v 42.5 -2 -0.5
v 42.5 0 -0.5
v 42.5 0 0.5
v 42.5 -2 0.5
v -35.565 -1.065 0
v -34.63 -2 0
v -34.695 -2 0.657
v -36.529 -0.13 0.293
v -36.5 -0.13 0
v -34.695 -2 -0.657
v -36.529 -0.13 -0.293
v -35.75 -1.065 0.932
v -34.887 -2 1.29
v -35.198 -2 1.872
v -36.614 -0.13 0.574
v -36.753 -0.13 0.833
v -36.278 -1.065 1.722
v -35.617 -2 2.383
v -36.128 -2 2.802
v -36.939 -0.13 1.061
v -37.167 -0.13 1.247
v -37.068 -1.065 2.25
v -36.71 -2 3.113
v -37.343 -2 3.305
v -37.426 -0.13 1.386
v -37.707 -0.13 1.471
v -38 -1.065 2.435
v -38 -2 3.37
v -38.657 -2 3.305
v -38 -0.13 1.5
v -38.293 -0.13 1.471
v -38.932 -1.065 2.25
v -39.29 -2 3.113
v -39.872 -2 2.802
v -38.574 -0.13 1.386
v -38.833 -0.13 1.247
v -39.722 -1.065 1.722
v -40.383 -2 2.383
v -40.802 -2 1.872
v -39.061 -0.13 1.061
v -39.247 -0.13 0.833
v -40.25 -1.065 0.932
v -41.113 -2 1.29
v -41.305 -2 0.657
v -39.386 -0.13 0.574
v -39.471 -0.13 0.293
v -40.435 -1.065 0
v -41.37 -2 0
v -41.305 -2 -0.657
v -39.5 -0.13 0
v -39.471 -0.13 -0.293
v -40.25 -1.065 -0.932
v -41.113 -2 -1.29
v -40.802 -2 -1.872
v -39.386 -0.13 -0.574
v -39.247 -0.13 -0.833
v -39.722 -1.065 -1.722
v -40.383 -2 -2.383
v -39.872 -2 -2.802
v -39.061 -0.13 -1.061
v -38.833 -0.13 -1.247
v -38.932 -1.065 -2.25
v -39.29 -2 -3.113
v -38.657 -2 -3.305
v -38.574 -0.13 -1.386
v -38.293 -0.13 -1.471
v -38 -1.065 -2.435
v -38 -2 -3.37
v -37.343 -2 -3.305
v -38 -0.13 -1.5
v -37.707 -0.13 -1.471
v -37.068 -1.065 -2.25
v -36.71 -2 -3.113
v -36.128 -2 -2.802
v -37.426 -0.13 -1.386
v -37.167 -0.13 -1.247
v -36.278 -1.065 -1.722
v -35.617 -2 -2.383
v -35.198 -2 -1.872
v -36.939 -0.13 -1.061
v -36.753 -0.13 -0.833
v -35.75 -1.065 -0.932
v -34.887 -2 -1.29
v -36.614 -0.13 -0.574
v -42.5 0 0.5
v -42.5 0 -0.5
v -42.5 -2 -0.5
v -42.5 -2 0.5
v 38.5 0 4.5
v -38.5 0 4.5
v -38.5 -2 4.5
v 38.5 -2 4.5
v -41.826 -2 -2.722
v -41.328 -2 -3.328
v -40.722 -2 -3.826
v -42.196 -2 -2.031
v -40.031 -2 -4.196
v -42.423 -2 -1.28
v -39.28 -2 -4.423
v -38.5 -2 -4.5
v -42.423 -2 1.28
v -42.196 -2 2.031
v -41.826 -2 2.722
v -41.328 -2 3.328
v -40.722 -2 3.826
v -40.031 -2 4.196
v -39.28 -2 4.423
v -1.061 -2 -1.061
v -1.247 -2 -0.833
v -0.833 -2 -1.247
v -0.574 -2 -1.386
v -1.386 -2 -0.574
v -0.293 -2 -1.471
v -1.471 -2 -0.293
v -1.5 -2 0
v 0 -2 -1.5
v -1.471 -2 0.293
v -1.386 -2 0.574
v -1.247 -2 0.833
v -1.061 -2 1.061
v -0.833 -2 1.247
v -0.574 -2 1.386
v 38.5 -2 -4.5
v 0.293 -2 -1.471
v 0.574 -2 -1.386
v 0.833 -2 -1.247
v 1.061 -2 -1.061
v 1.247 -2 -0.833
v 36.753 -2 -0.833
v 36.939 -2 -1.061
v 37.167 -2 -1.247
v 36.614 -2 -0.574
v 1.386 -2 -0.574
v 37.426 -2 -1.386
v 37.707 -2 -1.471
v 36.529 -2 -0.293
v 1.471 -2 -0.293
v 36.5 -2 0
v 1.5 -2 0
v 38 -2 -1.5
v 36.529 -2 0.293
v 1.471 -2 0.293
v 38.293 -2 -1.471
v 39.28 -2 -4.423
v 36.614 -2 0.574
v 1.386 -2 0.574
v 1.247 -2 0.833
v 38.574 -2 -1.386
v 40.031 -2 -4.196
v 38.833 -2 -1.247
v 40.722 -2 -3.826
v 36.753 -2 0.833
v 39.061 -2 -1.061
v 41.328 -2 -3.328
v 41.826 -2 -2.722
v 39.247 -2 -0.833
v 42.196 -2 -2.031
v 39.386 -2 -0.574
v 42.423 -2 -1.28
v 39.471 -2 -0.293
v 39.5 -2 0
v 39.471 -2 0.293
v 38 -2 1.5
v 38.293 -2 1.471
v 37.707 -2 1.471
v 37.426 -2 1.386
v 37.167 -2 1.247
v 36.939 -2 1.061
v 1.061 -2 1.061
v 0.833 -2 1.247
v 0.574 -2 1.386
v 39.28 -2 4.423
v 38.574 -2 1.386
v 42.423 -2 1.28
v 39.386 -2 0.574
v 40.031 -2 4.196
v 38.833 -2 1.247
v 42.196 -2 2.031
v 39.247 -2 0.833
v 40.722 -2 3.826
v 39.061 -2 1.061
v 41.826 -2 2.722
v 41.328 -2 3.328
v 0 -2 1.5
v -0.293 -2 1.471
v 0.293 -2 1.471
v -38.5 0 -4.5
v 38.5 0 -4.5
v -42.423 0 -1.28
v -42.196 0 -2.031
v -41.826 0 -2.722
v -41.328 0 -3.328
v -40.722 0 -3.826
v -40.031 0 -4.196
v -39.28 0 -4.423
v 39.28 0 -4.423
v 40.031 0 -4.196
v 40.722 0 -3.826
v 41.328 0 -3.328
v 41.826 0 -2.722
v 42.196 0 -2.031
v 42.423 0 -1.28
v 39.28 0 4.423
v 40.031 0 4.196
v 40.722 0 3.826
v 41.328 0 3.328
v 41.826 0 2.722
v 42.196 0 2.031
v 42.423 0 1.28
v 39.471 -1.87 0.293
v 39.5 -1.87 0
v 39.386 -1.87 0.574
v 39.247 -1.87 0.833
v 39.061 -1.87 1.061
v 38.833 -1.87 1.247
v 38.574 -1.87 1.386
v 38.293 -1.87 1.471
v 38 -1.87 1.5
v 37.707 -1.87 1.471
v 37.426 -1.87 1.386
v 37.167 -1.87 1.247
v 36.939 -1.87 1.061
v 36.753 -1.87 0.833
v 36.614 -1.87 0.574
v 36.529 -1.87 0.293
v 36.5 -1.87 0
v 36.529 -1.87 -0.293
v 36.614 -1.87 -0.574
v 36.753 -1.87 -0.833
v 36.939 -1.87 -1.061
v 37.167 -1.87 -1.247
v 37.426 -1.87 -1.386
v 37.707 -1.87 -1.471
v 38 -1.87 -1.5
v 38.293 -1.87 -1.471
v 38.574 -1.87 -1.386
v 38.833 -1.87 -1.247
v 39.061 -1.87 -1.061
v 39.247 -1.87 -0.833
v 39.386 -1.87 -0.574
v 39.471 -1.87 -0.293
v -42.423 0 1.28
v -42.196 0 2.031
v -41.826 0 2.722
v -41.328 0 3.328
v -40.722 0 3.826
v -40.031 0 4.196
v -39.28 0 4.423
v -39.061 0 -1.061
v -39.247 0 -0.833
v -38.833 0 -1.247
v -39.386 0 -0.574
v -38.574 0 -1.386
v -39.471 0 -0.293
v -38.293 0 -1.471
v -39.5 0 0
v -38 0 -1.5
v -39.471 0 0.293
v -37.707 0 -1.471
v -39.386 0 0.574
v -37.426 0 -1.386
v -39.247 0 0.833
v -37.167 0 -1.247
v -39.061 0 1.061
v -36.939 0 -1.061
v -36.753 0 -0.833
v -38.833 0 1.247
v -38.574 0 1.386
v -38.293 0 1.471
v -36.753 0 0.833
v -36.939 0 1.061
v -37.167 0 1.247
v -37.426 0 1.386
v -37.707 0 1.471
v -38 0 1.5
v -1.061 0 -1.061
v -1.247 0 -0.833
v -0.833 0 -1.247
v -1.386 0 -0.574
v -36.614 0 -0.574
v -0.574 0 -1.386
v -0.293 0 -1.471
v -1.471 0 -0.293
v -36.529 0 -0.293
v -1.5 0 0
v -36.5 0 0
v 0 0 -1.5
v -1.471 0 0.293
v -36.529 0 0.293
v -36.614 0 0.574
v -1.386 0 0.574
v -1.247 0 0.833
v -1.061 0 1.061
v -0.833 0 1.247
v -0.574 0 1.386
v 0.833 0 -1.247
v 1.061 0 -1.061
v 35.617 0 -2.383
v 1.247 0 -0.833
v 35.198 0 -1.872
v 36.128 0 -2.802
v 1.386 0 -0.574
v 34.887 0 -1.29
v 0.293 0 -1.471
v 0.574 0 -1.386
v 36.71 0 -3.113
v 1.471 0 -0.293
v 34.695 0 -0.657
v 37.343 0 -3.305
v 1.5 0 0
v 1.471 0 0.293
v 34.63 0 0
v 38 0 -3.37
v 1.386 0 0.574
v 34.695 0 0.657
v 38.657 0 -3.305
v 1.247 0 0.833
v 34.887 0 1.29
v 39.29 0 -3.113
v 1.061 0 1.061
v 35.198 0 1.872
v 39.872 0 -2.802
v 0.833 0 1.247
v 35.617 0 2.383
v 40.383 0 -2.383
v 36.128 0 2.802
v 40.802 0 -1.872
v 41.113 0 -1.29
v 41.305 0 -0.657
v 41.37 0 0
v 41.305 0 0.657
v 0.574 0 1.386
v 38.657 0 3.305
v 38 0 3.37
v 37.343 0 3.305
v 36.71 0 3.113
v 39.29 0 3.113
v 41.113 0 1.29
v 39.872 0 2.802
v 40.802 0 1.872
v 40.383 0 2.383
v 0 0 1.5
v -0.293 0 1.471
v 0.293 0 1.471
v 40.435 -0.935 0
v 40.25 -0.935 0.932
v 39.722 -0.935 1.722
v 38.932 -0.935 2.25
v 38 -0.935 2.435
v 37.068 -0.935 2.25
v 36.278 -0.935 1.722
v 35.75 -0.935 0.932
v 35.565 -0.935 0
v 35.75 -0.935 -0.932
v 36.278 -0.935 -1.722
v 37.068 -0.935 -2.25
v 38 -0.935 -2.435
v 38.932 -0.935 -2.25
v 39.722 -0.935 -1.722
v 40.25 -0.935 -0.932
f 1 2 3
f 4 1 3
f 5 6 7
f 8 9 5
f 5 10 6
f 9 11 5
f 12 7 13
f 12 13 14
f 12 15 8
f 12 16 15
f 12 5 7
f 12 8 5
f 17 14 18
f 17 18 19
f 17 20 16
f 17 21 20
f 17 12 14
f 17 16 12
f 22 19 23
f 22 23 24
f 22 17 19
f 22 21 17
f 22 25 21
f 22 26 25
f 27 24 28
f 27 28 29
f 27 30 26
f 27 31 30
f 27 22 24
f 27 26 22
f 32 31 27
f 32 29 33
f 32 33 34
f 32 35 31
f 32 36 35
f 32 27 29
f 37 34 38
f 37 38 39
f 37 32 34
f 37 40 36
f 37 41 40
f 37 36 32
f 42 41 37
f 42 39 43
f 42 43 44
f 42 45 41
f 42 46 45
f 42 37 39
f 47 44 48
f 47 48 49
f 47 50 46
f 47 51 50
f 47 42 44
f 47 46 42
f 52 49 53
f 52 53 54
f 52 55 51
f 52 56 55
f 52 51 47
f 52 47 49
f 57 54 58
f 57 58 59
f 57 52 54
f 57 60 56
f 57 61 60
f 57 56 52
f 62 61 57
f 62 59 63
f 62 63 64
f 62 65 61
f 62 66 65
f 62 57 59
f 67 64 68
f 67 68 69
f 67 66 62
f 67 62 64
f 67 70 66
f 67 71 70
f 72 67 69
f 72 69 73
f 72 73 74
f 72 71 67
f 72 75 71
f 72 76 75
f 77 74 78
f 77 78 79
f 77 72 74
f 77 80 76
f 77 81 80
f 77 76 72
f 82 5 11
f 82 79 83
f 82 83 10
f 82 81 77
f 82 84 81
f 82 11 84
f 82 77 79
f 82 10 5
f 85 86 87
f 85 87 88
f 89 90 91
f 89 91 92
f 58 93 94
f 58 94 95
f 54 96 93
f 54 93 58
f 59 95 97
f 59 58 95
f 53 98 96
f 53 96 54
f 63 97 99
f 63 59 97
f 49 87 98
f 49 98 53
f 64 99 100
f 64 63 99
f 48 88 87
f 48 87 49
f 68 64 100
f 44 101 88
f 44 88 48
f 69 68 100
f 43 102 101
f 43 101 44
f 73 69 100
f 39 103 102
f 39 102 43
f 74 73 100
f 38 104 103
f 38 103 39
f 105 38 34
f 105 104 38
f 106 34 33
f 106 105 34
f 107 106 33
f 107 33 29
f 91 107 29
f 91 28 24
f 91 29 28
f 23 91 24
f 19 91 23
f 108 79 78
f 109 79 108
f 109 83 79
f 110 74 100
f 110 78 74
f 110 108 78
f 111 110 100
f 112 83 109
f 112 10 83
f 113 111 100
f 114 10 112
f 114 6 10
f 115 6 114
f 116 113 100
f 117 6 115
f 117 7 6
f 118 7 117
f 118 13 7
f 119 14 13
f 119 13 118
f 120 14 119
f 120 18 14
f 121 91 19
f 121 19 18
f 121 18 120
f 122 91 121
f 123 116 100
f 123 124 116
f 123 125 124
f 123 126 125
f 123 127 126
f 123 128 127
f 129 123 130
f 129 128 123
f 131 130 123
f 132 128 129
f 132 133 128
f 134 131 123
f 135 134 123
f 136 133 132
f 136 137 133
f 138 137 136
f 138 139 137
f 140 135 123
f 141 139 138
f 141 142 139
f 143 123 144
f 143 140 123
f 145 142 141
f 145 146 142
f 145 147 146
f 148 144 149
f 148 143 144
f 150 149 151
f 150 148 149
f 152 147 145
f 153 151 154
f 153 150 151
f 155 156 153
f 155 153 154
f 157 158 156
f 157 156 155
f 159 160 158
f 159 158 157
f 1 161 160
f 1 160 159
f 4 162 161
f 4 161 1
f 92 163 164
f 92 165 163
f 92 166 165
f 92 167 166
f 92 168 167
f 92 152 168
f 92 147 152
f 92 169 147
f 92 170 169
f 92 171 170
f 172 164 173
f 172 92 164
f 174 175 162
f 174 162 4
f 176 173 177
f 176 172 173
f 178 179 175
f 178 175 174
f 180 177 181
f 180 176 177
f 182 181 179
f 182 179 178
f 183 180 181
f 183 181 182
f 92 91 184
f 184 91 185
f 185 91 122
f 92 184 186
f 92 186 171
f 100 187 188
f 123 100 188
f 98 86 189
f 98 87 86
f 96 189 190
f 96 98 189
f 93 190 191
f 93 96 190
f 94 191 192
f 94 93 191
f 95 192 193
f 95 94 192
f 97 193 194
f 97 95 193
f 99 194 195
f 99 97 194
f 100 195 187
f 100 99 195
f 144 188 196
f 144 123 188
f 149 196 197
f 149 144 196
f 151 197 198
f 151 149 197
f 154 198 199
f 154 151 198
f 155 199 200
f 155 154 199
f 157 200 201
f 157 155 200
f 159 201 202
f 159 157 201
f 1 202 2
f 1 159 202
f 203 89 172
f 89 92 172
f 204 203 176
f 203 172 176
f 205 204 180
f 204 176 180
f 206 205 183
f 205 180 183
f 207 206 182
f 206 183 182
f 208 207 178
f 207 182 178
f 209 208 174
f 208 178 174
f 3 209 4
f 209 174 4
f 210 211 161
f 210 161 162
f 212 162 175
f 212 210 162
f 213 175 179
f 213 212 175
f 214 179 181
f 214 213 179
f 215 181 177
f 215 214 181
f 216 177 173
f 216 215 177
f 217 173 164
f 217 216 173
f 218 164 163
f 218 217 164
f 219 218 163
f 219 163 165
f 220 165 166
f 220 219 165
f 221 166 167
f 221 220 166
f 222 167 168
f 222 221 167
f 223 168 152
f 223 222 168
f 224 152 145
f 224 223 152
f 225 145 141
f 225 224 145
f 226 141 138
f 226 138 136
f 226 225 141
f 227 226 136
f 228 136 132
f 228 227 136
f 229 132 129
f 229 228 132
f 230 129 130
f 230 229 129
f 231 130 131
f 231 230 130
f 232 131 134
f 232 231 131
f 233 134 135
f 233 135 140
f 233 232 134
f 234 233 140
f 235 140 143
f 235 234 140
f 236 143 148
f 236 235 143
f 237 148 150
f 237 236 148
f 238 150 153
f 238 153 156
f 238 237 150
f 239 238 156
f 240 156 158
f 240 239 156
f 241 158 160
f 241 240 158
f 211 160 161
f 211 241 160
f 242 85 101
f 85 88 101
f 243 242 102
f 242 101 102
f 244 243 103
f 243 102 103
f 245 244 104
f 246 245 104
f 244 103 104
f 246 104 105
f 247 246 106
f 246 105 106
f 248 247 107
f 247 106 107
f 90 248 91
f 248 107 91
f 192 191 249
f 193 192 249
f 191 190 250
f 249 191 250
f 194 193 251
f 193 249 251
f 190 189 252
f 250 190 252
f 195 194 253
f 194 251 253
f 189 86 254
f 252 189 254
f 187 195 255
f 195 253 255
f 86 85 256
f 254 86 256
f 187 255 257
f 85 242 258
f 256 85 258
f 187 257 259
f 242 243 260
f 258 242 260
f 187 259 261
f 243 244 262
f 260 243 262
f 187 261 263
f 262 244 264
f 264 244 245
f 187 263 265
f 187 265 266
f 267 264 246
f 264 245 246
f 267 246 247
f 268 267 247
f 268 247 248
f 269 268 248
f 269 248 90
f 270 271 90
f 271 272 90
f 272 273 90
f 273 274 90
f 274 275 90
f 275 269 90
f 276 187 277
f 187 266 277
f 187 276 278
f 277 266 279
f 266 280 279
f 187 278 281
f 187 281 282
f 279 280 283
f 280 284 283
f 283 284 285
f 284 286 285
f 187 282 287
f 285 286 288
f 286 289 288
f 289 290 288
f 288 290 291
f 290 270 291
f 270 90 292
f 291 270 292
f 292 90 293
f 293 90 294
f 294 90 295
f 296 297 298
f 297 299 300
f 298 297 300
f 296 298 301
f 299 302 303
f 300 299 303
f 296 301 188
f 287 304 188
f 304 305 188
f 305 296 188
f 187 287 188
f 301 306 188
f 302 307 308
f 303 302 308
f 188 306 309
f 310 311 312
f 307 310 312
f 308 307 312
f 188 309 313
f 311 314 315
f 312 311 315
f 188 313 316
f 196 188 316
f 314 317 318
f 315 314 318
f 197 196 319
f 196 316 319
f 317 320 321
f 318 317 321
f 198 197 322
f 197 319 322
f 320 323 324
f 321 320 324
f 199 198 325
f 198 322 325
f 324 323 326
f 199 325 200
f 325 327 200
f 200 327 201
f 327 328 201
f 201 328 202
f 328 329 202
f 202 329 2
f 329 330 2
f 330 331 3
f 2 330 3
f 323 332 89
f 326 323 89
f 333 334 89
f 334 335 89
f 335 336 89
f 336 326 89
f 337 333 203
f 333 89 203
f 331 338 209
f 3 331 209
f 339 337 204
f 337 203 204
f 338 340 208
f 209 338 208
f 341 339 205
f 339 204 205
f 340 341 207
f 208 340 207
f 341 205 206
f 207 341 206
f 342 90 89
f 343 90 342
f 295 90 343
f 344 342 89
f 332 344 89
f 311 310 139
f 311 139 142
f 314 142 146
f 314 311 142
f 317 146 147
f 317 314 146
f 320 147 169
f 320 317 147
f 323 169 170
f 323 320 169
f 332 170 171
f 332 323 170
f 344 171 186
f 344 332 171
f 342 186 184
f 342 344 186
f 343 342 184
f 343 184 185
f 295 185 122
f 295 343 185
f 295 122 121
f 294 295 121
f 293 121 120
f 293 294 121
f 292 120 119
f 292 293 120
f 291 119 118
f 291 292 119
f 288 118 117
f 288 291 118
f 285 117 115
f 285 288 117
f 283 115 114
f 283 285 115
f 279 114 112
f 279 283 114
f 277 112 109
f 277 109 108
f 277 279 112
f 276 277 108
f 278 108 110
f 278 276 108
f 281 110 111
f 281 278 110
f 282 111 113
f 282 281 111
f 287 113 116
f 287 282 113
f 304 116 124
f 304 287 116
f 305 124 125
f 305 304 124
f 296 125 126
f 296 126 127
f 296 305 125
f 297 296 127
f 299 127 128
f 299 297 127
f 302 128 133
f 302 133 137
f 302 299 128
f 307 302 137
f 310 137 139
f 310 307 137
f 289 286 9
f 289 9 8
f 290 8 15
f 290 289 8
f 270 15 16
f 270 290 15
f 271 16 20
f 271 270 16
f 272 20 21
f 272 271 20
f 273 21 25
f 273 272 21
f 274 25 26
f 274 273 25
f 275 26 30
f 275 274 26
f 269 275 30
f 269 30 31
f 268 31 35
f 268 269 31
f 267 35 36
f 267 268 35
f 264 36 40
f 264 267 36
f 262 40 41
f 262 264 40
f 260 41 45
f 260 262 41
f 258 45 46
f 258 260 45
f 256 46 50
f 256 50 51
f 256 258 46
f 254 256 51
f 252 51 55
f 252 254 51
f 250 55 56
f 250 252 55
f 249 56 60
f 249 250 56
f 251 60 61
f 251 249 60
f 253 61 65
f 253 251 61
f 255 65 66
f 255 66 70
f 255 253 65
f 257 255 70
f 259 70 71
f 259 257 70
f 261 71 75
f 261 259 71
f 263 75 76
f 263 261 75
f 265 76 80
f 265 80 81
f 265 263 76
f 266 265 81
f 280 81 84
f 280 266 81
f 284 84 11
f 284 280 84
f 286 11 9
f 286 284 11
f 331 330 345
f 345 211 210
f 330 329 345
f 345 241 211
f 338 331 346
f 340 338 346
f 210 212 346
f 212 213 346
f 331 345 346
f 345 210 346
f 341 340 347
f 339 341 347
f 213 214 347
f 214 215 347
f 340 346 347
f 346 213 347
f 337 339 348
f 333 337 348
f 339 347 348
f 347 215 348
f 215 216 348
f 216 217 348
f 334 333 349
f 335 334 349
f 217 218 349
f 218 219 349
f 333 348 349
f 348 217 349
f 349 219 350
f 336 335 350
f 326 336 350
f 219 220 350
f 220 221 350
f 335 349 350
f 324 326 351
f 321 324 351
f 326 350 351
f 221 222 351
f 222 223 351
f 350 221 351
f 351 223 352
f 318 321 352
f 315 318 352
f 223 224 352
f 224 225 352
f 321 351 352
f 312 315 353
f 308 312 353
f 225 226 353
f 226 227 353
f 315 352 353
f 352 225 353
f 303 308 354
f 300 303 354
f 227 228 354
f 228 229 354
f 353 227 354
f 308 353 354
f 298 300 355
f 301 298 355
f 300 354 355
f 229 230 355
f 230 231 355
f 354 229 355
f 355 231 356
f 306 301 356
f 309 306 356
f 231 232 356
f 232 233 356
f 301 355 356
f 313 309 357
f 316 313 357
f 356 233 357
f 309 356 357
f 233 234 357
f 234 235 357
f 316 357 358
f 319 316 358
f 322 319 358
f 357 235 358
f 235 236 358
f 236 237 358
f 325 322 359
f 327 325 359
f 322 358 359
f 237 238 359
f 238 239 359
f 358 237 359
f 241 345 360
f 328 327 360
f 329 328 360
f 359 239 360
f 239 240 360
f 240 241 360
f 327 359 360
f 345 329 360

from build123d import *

# Parameters (mm, degrees)
F0_W     = 85
F0_H     = 9
F0_R     = 1.5
F1_DEPTH = 2
F2_R     = 4
F3_SIZE  = 1.87


with BuildPart() as f1:
    # F0 (on Front) → F1 (new body)
    with BuildSketch(Plane.XZ):
        Rectangle(F0_W, F0_H)
        with Locations((-38, 0)):
            Circle(F0_R, mode=Mode.SUBTRACT)
        Circle(F0_R, mode=Mode.SUBTRACT)
        with Locations((38, 0)):
            Circle(F0_R, mode=Mode.SUBTRACT)
    extrude(amount=F1_DEPTH)

    # F2
    f2_edges = [f1.edges().sort_by_distance(p)[0] for p in [
        (-42.5, -1, 4.5),
        (-42.5, -1, -4.5),
        (42.5, -1, -4.5),
        (42.5, -1, 4.5),
    ]]
    fillet(f2_edges, radius=F2_R)

    # F3
    f3_edges = [f1.edges().sort_by_distance(p)[0] for p in [
        (-39.5, -2, 0),
        (36.5, 0, 0),
    ]]
    chamfer(f3_edges, length=F3_SIZE)


solid = f1.part
